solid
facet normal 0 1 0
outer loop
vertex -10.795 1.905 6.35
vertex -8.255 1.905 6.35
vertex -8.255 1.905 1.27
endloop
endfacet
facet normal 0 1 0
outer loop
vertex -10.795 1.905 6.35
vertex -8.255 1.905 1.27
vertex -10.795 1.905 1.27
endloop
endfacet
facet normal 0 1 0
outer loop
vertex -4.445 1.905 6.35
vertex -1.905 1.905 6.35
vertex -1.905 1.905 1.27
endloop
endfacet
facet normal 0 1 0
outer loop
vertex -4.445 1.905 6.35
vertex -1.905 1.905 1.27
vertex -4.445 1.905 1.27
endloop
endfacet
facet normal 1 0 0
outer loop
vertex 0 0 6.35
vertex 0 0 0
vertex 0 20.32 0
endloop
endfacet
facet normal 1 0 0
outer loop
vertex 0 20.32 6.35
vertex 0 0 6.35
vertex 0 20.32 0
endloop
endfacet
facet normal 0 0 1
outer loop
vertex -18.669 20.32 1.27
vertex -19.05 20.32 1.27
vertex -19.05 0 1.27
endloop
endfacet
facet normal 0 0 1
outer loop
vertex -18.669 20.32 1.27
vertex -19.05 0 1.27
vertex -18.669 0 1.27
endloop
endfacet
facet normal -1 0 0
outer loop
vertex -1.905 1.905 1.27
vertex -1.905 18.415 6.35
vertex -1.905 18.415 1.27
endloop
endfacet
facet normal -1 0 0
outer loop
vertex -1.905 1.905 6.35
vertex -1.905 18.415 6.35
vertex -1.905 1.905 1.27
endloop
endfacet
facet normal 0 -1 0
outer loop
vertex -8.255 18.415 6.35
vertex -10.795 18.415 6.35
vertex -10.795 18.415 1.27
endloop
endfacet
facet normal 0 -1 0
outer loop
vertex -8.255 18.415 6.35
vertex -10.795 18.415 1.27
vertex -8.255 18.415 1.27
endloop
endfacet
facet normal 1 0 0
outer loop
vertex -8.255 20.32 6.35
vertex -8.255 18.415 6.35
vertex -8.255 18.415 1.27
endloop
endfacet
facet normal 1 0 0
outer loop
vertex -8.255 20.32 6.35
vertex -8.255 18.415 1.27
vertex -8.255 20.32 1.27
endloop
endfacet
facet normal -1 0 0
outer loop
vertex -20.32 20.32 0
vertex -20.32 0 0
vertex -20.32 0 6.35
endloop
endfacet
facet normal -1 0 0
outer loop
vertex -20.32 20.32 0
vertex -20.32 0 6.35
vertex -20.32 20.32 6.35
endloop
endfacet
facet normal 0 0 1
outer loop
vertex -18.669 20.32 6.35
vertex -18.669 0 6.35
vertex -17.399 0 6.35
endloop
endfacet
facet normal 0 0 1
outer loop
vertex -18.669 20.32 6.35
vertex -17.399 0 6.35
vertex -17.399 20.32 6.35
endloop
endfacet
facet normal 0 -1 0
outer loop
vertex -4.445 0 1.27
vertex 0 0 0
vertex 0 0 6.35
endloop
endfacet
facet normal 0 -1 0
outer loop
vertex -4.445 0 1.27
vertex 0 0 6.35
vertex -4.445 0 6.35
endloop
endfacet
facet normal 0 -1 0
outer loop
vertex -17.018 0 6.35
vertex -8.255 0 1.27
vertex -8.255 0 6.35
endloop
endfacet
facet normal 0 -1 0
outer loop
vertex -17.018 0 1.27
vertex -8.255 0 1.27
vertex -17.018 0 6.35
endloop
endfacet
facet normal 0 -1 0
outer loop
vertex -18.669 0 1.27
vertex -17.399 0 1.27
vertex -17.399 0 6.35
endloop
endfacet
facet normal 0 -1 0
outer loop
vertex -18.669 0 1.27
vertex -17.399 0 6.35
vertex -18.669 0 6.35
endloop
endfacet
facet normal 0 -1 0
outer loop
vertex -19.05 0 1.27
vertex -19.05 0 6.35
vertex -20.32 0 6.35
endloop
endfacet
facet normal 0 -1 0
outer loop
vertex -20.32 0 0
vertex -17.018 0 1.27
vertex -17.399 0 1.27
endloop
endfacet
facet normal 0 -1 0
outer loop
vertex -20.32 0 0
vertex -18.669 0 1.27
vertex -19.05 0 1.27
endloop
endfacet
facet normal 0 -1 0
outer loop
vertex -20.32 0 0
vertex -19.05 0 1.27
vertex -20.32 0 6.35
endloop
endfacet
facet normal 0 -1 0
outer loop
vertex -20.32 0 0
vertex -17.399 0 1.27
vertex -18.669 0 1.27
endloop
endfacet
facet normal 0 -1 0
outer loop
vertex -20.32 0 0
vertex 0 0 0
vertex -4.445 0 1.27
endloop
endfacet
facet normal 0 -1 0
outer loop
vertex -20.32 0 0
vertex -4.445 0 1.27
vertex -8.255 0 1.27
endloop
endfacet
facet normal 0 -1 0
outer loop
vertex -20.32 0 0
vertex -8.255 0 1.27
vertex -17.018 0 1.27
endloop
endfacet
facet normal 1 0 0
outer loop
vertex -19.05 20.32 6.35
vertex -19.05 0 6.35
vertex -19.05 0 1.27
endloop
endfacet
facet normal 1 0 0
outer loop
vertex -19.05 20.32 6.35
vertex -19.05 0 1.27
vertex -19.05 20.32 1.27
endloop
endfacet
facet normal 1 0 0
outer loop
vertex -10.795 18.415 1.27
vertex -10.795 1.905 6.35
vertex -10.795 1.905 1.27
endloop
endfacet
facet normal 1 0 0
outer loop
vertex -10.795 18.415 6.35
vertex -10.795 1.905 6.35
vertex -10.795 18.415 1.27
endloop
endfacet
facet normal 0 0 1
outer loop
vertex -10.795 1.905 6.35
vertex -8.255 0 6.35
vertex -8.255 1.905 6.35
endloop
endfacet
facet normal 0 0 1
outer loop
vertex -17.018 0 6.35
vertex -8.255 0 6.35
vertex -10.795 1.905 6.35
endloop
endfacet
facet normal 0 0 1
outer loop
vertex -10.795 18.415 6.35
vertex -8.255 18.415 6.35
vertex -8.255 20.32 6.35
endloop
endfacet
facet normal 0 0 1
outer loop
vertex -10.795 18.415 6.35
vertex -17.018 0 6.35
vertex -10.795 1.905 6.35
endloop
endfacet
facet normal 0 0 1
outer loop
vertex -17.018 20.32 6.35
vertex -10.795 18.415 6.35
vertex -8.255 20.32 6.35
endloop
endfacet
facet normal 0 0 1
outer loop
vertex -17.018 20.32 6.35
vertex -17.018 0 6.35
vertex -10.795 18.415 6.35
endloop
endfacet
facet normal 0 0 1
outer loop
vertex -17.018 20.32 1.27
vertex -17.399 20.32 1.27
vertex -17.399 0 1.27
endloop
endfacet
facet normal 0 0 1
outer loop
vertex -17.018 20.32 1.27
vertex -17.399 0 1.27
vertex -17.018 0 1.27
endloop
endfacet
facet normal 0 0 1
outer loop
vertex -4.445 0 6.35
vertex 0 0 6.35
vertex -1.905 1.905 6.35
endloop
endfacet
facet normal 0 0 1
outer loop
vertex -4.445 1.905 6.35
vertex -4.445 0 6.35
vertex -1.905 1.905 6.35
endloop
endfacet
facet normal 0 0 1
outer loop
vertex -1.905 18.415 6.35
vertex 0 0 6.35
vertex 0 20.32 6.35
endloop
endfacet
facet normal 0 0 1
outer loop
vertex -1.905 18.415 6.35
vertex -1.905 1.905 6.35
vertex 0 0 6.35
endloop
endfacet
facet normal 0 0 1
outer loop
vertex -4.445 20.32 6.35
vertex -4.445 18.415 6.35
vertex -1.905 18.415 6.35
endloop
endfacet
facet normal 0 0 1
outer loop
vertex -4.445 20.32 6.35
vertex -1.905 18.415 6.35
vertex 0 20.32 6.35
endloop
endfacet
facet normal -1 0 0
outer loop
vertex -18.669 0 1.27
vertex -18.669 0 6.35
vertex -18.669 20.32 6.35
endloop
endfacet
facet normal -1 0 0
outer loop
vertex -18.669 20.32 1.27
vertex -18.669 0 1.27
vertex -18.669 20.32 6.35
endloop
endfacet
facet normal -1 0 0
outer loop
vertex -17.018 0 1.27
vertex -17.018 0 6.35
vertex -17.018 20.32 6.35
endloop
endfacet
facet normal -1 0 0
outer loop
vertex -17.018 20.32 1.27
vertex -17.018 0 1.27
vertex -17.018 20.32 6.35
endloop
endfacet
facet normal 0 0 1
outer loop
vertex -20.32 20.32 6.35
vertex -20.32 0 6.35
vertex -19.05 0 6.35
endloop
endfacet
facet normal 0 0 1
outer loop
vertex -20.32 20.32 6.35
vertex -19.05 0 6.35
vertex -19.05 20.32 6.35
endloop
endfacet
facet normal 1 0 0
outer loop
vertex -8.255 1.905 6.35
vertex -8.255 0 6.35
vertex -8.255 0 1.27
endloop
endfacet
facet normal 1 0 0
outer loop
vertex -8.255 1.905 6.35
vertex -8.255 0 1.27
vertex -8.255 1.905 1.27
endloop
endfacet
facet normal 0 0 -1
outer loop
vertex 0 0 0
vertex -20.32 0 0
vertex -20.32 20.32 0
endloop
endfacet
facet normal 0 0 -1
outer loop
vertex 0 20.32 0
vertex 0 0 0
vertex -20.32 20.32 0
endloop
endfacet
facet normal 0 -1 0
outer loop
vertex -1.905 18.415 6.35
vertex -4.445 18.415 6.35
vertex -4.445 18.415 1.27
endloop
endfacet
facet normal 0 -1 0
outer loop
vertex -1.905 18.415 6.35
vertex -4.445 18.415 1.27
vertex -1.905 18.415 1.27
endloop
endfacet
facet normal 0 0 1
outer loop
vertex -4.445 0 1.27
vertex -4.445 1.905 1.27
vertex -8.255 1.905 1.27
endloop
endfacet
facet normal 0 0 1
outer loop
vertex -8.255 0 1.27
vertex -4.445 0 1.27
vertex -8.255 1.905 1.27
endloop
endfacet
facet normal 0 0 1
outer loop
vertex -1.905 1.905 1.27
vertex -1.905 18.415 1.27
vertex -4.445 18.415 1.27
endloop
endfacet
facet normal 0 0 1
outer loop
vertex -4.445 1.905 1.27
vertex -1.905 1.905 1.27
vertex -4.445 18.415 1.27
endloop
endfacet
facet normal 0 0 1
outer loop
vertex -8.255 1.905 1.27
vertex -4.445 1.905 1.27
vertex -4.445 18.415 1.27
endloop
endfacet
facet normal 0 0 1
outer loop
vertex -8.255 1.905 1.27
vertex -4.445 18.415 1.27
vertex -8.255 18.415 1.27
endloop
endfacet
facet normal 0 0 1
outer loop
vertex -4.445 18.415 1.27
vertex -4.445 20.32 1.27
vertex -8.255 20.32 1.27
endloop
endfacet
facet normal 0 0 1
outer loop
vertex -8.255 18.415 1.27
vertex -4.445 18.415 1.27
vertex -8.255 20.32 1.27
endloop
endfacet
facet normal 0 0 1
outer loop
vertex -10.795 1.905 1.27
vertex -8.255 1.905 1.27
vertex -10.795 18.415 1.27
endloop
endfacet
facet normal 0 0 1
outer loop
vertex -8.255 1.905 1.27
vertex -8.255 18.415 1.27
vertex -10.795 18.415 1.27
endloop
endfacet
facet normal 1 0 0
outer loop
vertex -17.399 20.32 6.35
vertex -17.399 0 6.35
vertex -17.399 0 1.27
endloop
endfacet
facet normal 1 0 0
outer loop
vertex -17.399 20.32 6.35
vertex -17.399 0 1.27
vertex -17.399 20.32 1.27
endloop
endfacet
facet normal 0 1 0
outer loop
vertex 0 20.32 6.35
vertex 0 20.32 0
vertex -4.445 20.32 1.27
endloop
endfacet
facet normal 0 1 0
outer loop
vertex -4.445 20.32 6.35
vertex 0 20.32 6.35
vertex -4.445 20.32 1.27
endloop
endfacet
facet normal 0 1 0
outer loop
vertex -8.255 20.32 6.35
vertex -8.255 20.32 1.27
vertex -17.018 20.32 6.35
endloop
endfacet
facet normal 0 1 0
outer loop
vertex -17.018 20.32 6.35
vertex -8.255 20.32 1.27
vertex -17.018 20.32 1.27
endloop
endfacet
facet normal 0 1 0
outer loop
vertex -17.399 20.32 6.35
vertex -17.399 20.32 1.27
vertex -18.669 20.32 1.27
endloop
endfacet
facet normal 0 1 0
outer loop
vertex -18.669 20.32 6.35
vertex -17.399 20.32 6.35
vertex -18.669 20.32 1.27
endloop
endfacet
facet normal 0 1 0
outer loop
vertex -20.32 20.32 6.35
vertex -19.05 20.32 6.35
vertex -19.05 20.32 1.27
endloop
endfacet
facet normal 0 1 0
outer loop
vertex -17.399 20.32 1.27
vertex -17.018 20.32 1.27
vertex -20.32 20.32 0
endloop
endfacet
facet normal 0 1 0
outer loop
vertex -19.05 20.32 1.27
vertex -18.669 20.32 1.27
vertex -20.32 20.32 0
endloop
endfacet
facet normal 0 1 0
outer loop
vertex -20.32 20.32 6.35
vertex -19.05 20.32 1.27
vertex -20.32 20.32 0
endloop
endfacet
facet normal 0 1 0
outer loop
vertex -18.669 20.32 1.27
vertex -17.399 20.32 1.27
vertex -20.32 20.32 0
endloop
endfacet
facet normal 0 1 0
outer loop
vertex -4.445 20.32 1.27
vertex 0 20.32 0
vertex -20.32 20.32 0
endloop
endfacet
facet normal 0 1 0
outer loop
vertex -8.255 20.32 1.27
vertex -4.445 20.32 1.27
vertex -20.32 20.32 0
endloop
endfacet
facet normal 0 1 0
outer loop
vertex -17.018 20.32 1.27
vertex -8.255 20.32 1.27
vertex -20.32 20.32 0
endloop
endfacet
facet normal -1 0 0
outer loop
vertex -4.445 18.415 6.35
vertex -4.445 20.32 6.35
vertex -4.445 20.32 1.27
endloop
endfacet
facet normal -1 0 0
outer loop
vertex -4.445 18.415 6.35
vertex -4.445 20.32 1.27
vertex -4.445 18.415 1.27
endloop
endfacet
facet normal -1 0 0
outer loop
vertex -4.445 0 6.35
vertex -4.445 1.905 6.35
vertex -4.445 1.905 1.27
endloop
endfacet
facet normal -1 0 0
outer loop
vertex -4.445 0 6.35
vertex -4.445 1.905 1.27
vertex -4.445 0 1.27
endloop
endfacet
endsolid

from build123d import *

# Parameters (mm, degrees)
SKETCH1_W           = 20.32
SKETCH1_H           = 20.32
BOSS_EXTRUDE1_DEPTH = 6.35
CUT_EXTRUDE1_DEPTH  = 5.08
SKETCH4_W           = 0.381
SKETCH4_H           = 21.648681081
CUT_EXTRUDE2_DEPTH  = 5.08


with BuildPart() as part:
    # Sketch1 → Boss-Extrude1 (new body)
    with BuildSketch(Plane(origin=(0, 0, 0), x_dir=(0, 1, 0), z_dir=(0, 0, 1))):
        with Locations((10.16, 10.16)):
            Rectangle(SKETCH1_W, SKETCH1_H)
    extrude(amount=BOSS_EXTRUDE1_DEPTH)

    # Sketch2 → Cut-Extrude1 (cut)
    with BuildSketch(Plane.XY.offset(6.35)):
        Polygon((-10.795, 18.415), (-8.255, 18.415), (-8.255, 20.32), (-4.445, 20.32), (-4.445, 18.415), (-1.905, 18.415), (-1.905, 1.905), (-4.445, 1.905), (-4.445, -0.532919187), (-8.255, -0.532919187), (-8.255, 1.905), (-10.795, 1.905), align=None)
    extrude(amount=-CUT_EXTRUDE1_DEPTH, mode=Mode.SUBTRACT)

    # Sketch4 → Cut-Extrude2 (cut)
    with BuildSketch(Plane.XY.offset(6.35)):
        with Locations((-18.8595, 9.956894273)):
            Rectangle(SKETCH4_W, SKETCH4_H)
        with Locations((-17.2085, 9.956894273)):
            Rectangle(SKETCH4_W, SKETCH4_H)
    extrude(amount=-CUT_EXTRUDE2_DEPTH, mode=Mode.SUBTRACT)


solid = part.part
